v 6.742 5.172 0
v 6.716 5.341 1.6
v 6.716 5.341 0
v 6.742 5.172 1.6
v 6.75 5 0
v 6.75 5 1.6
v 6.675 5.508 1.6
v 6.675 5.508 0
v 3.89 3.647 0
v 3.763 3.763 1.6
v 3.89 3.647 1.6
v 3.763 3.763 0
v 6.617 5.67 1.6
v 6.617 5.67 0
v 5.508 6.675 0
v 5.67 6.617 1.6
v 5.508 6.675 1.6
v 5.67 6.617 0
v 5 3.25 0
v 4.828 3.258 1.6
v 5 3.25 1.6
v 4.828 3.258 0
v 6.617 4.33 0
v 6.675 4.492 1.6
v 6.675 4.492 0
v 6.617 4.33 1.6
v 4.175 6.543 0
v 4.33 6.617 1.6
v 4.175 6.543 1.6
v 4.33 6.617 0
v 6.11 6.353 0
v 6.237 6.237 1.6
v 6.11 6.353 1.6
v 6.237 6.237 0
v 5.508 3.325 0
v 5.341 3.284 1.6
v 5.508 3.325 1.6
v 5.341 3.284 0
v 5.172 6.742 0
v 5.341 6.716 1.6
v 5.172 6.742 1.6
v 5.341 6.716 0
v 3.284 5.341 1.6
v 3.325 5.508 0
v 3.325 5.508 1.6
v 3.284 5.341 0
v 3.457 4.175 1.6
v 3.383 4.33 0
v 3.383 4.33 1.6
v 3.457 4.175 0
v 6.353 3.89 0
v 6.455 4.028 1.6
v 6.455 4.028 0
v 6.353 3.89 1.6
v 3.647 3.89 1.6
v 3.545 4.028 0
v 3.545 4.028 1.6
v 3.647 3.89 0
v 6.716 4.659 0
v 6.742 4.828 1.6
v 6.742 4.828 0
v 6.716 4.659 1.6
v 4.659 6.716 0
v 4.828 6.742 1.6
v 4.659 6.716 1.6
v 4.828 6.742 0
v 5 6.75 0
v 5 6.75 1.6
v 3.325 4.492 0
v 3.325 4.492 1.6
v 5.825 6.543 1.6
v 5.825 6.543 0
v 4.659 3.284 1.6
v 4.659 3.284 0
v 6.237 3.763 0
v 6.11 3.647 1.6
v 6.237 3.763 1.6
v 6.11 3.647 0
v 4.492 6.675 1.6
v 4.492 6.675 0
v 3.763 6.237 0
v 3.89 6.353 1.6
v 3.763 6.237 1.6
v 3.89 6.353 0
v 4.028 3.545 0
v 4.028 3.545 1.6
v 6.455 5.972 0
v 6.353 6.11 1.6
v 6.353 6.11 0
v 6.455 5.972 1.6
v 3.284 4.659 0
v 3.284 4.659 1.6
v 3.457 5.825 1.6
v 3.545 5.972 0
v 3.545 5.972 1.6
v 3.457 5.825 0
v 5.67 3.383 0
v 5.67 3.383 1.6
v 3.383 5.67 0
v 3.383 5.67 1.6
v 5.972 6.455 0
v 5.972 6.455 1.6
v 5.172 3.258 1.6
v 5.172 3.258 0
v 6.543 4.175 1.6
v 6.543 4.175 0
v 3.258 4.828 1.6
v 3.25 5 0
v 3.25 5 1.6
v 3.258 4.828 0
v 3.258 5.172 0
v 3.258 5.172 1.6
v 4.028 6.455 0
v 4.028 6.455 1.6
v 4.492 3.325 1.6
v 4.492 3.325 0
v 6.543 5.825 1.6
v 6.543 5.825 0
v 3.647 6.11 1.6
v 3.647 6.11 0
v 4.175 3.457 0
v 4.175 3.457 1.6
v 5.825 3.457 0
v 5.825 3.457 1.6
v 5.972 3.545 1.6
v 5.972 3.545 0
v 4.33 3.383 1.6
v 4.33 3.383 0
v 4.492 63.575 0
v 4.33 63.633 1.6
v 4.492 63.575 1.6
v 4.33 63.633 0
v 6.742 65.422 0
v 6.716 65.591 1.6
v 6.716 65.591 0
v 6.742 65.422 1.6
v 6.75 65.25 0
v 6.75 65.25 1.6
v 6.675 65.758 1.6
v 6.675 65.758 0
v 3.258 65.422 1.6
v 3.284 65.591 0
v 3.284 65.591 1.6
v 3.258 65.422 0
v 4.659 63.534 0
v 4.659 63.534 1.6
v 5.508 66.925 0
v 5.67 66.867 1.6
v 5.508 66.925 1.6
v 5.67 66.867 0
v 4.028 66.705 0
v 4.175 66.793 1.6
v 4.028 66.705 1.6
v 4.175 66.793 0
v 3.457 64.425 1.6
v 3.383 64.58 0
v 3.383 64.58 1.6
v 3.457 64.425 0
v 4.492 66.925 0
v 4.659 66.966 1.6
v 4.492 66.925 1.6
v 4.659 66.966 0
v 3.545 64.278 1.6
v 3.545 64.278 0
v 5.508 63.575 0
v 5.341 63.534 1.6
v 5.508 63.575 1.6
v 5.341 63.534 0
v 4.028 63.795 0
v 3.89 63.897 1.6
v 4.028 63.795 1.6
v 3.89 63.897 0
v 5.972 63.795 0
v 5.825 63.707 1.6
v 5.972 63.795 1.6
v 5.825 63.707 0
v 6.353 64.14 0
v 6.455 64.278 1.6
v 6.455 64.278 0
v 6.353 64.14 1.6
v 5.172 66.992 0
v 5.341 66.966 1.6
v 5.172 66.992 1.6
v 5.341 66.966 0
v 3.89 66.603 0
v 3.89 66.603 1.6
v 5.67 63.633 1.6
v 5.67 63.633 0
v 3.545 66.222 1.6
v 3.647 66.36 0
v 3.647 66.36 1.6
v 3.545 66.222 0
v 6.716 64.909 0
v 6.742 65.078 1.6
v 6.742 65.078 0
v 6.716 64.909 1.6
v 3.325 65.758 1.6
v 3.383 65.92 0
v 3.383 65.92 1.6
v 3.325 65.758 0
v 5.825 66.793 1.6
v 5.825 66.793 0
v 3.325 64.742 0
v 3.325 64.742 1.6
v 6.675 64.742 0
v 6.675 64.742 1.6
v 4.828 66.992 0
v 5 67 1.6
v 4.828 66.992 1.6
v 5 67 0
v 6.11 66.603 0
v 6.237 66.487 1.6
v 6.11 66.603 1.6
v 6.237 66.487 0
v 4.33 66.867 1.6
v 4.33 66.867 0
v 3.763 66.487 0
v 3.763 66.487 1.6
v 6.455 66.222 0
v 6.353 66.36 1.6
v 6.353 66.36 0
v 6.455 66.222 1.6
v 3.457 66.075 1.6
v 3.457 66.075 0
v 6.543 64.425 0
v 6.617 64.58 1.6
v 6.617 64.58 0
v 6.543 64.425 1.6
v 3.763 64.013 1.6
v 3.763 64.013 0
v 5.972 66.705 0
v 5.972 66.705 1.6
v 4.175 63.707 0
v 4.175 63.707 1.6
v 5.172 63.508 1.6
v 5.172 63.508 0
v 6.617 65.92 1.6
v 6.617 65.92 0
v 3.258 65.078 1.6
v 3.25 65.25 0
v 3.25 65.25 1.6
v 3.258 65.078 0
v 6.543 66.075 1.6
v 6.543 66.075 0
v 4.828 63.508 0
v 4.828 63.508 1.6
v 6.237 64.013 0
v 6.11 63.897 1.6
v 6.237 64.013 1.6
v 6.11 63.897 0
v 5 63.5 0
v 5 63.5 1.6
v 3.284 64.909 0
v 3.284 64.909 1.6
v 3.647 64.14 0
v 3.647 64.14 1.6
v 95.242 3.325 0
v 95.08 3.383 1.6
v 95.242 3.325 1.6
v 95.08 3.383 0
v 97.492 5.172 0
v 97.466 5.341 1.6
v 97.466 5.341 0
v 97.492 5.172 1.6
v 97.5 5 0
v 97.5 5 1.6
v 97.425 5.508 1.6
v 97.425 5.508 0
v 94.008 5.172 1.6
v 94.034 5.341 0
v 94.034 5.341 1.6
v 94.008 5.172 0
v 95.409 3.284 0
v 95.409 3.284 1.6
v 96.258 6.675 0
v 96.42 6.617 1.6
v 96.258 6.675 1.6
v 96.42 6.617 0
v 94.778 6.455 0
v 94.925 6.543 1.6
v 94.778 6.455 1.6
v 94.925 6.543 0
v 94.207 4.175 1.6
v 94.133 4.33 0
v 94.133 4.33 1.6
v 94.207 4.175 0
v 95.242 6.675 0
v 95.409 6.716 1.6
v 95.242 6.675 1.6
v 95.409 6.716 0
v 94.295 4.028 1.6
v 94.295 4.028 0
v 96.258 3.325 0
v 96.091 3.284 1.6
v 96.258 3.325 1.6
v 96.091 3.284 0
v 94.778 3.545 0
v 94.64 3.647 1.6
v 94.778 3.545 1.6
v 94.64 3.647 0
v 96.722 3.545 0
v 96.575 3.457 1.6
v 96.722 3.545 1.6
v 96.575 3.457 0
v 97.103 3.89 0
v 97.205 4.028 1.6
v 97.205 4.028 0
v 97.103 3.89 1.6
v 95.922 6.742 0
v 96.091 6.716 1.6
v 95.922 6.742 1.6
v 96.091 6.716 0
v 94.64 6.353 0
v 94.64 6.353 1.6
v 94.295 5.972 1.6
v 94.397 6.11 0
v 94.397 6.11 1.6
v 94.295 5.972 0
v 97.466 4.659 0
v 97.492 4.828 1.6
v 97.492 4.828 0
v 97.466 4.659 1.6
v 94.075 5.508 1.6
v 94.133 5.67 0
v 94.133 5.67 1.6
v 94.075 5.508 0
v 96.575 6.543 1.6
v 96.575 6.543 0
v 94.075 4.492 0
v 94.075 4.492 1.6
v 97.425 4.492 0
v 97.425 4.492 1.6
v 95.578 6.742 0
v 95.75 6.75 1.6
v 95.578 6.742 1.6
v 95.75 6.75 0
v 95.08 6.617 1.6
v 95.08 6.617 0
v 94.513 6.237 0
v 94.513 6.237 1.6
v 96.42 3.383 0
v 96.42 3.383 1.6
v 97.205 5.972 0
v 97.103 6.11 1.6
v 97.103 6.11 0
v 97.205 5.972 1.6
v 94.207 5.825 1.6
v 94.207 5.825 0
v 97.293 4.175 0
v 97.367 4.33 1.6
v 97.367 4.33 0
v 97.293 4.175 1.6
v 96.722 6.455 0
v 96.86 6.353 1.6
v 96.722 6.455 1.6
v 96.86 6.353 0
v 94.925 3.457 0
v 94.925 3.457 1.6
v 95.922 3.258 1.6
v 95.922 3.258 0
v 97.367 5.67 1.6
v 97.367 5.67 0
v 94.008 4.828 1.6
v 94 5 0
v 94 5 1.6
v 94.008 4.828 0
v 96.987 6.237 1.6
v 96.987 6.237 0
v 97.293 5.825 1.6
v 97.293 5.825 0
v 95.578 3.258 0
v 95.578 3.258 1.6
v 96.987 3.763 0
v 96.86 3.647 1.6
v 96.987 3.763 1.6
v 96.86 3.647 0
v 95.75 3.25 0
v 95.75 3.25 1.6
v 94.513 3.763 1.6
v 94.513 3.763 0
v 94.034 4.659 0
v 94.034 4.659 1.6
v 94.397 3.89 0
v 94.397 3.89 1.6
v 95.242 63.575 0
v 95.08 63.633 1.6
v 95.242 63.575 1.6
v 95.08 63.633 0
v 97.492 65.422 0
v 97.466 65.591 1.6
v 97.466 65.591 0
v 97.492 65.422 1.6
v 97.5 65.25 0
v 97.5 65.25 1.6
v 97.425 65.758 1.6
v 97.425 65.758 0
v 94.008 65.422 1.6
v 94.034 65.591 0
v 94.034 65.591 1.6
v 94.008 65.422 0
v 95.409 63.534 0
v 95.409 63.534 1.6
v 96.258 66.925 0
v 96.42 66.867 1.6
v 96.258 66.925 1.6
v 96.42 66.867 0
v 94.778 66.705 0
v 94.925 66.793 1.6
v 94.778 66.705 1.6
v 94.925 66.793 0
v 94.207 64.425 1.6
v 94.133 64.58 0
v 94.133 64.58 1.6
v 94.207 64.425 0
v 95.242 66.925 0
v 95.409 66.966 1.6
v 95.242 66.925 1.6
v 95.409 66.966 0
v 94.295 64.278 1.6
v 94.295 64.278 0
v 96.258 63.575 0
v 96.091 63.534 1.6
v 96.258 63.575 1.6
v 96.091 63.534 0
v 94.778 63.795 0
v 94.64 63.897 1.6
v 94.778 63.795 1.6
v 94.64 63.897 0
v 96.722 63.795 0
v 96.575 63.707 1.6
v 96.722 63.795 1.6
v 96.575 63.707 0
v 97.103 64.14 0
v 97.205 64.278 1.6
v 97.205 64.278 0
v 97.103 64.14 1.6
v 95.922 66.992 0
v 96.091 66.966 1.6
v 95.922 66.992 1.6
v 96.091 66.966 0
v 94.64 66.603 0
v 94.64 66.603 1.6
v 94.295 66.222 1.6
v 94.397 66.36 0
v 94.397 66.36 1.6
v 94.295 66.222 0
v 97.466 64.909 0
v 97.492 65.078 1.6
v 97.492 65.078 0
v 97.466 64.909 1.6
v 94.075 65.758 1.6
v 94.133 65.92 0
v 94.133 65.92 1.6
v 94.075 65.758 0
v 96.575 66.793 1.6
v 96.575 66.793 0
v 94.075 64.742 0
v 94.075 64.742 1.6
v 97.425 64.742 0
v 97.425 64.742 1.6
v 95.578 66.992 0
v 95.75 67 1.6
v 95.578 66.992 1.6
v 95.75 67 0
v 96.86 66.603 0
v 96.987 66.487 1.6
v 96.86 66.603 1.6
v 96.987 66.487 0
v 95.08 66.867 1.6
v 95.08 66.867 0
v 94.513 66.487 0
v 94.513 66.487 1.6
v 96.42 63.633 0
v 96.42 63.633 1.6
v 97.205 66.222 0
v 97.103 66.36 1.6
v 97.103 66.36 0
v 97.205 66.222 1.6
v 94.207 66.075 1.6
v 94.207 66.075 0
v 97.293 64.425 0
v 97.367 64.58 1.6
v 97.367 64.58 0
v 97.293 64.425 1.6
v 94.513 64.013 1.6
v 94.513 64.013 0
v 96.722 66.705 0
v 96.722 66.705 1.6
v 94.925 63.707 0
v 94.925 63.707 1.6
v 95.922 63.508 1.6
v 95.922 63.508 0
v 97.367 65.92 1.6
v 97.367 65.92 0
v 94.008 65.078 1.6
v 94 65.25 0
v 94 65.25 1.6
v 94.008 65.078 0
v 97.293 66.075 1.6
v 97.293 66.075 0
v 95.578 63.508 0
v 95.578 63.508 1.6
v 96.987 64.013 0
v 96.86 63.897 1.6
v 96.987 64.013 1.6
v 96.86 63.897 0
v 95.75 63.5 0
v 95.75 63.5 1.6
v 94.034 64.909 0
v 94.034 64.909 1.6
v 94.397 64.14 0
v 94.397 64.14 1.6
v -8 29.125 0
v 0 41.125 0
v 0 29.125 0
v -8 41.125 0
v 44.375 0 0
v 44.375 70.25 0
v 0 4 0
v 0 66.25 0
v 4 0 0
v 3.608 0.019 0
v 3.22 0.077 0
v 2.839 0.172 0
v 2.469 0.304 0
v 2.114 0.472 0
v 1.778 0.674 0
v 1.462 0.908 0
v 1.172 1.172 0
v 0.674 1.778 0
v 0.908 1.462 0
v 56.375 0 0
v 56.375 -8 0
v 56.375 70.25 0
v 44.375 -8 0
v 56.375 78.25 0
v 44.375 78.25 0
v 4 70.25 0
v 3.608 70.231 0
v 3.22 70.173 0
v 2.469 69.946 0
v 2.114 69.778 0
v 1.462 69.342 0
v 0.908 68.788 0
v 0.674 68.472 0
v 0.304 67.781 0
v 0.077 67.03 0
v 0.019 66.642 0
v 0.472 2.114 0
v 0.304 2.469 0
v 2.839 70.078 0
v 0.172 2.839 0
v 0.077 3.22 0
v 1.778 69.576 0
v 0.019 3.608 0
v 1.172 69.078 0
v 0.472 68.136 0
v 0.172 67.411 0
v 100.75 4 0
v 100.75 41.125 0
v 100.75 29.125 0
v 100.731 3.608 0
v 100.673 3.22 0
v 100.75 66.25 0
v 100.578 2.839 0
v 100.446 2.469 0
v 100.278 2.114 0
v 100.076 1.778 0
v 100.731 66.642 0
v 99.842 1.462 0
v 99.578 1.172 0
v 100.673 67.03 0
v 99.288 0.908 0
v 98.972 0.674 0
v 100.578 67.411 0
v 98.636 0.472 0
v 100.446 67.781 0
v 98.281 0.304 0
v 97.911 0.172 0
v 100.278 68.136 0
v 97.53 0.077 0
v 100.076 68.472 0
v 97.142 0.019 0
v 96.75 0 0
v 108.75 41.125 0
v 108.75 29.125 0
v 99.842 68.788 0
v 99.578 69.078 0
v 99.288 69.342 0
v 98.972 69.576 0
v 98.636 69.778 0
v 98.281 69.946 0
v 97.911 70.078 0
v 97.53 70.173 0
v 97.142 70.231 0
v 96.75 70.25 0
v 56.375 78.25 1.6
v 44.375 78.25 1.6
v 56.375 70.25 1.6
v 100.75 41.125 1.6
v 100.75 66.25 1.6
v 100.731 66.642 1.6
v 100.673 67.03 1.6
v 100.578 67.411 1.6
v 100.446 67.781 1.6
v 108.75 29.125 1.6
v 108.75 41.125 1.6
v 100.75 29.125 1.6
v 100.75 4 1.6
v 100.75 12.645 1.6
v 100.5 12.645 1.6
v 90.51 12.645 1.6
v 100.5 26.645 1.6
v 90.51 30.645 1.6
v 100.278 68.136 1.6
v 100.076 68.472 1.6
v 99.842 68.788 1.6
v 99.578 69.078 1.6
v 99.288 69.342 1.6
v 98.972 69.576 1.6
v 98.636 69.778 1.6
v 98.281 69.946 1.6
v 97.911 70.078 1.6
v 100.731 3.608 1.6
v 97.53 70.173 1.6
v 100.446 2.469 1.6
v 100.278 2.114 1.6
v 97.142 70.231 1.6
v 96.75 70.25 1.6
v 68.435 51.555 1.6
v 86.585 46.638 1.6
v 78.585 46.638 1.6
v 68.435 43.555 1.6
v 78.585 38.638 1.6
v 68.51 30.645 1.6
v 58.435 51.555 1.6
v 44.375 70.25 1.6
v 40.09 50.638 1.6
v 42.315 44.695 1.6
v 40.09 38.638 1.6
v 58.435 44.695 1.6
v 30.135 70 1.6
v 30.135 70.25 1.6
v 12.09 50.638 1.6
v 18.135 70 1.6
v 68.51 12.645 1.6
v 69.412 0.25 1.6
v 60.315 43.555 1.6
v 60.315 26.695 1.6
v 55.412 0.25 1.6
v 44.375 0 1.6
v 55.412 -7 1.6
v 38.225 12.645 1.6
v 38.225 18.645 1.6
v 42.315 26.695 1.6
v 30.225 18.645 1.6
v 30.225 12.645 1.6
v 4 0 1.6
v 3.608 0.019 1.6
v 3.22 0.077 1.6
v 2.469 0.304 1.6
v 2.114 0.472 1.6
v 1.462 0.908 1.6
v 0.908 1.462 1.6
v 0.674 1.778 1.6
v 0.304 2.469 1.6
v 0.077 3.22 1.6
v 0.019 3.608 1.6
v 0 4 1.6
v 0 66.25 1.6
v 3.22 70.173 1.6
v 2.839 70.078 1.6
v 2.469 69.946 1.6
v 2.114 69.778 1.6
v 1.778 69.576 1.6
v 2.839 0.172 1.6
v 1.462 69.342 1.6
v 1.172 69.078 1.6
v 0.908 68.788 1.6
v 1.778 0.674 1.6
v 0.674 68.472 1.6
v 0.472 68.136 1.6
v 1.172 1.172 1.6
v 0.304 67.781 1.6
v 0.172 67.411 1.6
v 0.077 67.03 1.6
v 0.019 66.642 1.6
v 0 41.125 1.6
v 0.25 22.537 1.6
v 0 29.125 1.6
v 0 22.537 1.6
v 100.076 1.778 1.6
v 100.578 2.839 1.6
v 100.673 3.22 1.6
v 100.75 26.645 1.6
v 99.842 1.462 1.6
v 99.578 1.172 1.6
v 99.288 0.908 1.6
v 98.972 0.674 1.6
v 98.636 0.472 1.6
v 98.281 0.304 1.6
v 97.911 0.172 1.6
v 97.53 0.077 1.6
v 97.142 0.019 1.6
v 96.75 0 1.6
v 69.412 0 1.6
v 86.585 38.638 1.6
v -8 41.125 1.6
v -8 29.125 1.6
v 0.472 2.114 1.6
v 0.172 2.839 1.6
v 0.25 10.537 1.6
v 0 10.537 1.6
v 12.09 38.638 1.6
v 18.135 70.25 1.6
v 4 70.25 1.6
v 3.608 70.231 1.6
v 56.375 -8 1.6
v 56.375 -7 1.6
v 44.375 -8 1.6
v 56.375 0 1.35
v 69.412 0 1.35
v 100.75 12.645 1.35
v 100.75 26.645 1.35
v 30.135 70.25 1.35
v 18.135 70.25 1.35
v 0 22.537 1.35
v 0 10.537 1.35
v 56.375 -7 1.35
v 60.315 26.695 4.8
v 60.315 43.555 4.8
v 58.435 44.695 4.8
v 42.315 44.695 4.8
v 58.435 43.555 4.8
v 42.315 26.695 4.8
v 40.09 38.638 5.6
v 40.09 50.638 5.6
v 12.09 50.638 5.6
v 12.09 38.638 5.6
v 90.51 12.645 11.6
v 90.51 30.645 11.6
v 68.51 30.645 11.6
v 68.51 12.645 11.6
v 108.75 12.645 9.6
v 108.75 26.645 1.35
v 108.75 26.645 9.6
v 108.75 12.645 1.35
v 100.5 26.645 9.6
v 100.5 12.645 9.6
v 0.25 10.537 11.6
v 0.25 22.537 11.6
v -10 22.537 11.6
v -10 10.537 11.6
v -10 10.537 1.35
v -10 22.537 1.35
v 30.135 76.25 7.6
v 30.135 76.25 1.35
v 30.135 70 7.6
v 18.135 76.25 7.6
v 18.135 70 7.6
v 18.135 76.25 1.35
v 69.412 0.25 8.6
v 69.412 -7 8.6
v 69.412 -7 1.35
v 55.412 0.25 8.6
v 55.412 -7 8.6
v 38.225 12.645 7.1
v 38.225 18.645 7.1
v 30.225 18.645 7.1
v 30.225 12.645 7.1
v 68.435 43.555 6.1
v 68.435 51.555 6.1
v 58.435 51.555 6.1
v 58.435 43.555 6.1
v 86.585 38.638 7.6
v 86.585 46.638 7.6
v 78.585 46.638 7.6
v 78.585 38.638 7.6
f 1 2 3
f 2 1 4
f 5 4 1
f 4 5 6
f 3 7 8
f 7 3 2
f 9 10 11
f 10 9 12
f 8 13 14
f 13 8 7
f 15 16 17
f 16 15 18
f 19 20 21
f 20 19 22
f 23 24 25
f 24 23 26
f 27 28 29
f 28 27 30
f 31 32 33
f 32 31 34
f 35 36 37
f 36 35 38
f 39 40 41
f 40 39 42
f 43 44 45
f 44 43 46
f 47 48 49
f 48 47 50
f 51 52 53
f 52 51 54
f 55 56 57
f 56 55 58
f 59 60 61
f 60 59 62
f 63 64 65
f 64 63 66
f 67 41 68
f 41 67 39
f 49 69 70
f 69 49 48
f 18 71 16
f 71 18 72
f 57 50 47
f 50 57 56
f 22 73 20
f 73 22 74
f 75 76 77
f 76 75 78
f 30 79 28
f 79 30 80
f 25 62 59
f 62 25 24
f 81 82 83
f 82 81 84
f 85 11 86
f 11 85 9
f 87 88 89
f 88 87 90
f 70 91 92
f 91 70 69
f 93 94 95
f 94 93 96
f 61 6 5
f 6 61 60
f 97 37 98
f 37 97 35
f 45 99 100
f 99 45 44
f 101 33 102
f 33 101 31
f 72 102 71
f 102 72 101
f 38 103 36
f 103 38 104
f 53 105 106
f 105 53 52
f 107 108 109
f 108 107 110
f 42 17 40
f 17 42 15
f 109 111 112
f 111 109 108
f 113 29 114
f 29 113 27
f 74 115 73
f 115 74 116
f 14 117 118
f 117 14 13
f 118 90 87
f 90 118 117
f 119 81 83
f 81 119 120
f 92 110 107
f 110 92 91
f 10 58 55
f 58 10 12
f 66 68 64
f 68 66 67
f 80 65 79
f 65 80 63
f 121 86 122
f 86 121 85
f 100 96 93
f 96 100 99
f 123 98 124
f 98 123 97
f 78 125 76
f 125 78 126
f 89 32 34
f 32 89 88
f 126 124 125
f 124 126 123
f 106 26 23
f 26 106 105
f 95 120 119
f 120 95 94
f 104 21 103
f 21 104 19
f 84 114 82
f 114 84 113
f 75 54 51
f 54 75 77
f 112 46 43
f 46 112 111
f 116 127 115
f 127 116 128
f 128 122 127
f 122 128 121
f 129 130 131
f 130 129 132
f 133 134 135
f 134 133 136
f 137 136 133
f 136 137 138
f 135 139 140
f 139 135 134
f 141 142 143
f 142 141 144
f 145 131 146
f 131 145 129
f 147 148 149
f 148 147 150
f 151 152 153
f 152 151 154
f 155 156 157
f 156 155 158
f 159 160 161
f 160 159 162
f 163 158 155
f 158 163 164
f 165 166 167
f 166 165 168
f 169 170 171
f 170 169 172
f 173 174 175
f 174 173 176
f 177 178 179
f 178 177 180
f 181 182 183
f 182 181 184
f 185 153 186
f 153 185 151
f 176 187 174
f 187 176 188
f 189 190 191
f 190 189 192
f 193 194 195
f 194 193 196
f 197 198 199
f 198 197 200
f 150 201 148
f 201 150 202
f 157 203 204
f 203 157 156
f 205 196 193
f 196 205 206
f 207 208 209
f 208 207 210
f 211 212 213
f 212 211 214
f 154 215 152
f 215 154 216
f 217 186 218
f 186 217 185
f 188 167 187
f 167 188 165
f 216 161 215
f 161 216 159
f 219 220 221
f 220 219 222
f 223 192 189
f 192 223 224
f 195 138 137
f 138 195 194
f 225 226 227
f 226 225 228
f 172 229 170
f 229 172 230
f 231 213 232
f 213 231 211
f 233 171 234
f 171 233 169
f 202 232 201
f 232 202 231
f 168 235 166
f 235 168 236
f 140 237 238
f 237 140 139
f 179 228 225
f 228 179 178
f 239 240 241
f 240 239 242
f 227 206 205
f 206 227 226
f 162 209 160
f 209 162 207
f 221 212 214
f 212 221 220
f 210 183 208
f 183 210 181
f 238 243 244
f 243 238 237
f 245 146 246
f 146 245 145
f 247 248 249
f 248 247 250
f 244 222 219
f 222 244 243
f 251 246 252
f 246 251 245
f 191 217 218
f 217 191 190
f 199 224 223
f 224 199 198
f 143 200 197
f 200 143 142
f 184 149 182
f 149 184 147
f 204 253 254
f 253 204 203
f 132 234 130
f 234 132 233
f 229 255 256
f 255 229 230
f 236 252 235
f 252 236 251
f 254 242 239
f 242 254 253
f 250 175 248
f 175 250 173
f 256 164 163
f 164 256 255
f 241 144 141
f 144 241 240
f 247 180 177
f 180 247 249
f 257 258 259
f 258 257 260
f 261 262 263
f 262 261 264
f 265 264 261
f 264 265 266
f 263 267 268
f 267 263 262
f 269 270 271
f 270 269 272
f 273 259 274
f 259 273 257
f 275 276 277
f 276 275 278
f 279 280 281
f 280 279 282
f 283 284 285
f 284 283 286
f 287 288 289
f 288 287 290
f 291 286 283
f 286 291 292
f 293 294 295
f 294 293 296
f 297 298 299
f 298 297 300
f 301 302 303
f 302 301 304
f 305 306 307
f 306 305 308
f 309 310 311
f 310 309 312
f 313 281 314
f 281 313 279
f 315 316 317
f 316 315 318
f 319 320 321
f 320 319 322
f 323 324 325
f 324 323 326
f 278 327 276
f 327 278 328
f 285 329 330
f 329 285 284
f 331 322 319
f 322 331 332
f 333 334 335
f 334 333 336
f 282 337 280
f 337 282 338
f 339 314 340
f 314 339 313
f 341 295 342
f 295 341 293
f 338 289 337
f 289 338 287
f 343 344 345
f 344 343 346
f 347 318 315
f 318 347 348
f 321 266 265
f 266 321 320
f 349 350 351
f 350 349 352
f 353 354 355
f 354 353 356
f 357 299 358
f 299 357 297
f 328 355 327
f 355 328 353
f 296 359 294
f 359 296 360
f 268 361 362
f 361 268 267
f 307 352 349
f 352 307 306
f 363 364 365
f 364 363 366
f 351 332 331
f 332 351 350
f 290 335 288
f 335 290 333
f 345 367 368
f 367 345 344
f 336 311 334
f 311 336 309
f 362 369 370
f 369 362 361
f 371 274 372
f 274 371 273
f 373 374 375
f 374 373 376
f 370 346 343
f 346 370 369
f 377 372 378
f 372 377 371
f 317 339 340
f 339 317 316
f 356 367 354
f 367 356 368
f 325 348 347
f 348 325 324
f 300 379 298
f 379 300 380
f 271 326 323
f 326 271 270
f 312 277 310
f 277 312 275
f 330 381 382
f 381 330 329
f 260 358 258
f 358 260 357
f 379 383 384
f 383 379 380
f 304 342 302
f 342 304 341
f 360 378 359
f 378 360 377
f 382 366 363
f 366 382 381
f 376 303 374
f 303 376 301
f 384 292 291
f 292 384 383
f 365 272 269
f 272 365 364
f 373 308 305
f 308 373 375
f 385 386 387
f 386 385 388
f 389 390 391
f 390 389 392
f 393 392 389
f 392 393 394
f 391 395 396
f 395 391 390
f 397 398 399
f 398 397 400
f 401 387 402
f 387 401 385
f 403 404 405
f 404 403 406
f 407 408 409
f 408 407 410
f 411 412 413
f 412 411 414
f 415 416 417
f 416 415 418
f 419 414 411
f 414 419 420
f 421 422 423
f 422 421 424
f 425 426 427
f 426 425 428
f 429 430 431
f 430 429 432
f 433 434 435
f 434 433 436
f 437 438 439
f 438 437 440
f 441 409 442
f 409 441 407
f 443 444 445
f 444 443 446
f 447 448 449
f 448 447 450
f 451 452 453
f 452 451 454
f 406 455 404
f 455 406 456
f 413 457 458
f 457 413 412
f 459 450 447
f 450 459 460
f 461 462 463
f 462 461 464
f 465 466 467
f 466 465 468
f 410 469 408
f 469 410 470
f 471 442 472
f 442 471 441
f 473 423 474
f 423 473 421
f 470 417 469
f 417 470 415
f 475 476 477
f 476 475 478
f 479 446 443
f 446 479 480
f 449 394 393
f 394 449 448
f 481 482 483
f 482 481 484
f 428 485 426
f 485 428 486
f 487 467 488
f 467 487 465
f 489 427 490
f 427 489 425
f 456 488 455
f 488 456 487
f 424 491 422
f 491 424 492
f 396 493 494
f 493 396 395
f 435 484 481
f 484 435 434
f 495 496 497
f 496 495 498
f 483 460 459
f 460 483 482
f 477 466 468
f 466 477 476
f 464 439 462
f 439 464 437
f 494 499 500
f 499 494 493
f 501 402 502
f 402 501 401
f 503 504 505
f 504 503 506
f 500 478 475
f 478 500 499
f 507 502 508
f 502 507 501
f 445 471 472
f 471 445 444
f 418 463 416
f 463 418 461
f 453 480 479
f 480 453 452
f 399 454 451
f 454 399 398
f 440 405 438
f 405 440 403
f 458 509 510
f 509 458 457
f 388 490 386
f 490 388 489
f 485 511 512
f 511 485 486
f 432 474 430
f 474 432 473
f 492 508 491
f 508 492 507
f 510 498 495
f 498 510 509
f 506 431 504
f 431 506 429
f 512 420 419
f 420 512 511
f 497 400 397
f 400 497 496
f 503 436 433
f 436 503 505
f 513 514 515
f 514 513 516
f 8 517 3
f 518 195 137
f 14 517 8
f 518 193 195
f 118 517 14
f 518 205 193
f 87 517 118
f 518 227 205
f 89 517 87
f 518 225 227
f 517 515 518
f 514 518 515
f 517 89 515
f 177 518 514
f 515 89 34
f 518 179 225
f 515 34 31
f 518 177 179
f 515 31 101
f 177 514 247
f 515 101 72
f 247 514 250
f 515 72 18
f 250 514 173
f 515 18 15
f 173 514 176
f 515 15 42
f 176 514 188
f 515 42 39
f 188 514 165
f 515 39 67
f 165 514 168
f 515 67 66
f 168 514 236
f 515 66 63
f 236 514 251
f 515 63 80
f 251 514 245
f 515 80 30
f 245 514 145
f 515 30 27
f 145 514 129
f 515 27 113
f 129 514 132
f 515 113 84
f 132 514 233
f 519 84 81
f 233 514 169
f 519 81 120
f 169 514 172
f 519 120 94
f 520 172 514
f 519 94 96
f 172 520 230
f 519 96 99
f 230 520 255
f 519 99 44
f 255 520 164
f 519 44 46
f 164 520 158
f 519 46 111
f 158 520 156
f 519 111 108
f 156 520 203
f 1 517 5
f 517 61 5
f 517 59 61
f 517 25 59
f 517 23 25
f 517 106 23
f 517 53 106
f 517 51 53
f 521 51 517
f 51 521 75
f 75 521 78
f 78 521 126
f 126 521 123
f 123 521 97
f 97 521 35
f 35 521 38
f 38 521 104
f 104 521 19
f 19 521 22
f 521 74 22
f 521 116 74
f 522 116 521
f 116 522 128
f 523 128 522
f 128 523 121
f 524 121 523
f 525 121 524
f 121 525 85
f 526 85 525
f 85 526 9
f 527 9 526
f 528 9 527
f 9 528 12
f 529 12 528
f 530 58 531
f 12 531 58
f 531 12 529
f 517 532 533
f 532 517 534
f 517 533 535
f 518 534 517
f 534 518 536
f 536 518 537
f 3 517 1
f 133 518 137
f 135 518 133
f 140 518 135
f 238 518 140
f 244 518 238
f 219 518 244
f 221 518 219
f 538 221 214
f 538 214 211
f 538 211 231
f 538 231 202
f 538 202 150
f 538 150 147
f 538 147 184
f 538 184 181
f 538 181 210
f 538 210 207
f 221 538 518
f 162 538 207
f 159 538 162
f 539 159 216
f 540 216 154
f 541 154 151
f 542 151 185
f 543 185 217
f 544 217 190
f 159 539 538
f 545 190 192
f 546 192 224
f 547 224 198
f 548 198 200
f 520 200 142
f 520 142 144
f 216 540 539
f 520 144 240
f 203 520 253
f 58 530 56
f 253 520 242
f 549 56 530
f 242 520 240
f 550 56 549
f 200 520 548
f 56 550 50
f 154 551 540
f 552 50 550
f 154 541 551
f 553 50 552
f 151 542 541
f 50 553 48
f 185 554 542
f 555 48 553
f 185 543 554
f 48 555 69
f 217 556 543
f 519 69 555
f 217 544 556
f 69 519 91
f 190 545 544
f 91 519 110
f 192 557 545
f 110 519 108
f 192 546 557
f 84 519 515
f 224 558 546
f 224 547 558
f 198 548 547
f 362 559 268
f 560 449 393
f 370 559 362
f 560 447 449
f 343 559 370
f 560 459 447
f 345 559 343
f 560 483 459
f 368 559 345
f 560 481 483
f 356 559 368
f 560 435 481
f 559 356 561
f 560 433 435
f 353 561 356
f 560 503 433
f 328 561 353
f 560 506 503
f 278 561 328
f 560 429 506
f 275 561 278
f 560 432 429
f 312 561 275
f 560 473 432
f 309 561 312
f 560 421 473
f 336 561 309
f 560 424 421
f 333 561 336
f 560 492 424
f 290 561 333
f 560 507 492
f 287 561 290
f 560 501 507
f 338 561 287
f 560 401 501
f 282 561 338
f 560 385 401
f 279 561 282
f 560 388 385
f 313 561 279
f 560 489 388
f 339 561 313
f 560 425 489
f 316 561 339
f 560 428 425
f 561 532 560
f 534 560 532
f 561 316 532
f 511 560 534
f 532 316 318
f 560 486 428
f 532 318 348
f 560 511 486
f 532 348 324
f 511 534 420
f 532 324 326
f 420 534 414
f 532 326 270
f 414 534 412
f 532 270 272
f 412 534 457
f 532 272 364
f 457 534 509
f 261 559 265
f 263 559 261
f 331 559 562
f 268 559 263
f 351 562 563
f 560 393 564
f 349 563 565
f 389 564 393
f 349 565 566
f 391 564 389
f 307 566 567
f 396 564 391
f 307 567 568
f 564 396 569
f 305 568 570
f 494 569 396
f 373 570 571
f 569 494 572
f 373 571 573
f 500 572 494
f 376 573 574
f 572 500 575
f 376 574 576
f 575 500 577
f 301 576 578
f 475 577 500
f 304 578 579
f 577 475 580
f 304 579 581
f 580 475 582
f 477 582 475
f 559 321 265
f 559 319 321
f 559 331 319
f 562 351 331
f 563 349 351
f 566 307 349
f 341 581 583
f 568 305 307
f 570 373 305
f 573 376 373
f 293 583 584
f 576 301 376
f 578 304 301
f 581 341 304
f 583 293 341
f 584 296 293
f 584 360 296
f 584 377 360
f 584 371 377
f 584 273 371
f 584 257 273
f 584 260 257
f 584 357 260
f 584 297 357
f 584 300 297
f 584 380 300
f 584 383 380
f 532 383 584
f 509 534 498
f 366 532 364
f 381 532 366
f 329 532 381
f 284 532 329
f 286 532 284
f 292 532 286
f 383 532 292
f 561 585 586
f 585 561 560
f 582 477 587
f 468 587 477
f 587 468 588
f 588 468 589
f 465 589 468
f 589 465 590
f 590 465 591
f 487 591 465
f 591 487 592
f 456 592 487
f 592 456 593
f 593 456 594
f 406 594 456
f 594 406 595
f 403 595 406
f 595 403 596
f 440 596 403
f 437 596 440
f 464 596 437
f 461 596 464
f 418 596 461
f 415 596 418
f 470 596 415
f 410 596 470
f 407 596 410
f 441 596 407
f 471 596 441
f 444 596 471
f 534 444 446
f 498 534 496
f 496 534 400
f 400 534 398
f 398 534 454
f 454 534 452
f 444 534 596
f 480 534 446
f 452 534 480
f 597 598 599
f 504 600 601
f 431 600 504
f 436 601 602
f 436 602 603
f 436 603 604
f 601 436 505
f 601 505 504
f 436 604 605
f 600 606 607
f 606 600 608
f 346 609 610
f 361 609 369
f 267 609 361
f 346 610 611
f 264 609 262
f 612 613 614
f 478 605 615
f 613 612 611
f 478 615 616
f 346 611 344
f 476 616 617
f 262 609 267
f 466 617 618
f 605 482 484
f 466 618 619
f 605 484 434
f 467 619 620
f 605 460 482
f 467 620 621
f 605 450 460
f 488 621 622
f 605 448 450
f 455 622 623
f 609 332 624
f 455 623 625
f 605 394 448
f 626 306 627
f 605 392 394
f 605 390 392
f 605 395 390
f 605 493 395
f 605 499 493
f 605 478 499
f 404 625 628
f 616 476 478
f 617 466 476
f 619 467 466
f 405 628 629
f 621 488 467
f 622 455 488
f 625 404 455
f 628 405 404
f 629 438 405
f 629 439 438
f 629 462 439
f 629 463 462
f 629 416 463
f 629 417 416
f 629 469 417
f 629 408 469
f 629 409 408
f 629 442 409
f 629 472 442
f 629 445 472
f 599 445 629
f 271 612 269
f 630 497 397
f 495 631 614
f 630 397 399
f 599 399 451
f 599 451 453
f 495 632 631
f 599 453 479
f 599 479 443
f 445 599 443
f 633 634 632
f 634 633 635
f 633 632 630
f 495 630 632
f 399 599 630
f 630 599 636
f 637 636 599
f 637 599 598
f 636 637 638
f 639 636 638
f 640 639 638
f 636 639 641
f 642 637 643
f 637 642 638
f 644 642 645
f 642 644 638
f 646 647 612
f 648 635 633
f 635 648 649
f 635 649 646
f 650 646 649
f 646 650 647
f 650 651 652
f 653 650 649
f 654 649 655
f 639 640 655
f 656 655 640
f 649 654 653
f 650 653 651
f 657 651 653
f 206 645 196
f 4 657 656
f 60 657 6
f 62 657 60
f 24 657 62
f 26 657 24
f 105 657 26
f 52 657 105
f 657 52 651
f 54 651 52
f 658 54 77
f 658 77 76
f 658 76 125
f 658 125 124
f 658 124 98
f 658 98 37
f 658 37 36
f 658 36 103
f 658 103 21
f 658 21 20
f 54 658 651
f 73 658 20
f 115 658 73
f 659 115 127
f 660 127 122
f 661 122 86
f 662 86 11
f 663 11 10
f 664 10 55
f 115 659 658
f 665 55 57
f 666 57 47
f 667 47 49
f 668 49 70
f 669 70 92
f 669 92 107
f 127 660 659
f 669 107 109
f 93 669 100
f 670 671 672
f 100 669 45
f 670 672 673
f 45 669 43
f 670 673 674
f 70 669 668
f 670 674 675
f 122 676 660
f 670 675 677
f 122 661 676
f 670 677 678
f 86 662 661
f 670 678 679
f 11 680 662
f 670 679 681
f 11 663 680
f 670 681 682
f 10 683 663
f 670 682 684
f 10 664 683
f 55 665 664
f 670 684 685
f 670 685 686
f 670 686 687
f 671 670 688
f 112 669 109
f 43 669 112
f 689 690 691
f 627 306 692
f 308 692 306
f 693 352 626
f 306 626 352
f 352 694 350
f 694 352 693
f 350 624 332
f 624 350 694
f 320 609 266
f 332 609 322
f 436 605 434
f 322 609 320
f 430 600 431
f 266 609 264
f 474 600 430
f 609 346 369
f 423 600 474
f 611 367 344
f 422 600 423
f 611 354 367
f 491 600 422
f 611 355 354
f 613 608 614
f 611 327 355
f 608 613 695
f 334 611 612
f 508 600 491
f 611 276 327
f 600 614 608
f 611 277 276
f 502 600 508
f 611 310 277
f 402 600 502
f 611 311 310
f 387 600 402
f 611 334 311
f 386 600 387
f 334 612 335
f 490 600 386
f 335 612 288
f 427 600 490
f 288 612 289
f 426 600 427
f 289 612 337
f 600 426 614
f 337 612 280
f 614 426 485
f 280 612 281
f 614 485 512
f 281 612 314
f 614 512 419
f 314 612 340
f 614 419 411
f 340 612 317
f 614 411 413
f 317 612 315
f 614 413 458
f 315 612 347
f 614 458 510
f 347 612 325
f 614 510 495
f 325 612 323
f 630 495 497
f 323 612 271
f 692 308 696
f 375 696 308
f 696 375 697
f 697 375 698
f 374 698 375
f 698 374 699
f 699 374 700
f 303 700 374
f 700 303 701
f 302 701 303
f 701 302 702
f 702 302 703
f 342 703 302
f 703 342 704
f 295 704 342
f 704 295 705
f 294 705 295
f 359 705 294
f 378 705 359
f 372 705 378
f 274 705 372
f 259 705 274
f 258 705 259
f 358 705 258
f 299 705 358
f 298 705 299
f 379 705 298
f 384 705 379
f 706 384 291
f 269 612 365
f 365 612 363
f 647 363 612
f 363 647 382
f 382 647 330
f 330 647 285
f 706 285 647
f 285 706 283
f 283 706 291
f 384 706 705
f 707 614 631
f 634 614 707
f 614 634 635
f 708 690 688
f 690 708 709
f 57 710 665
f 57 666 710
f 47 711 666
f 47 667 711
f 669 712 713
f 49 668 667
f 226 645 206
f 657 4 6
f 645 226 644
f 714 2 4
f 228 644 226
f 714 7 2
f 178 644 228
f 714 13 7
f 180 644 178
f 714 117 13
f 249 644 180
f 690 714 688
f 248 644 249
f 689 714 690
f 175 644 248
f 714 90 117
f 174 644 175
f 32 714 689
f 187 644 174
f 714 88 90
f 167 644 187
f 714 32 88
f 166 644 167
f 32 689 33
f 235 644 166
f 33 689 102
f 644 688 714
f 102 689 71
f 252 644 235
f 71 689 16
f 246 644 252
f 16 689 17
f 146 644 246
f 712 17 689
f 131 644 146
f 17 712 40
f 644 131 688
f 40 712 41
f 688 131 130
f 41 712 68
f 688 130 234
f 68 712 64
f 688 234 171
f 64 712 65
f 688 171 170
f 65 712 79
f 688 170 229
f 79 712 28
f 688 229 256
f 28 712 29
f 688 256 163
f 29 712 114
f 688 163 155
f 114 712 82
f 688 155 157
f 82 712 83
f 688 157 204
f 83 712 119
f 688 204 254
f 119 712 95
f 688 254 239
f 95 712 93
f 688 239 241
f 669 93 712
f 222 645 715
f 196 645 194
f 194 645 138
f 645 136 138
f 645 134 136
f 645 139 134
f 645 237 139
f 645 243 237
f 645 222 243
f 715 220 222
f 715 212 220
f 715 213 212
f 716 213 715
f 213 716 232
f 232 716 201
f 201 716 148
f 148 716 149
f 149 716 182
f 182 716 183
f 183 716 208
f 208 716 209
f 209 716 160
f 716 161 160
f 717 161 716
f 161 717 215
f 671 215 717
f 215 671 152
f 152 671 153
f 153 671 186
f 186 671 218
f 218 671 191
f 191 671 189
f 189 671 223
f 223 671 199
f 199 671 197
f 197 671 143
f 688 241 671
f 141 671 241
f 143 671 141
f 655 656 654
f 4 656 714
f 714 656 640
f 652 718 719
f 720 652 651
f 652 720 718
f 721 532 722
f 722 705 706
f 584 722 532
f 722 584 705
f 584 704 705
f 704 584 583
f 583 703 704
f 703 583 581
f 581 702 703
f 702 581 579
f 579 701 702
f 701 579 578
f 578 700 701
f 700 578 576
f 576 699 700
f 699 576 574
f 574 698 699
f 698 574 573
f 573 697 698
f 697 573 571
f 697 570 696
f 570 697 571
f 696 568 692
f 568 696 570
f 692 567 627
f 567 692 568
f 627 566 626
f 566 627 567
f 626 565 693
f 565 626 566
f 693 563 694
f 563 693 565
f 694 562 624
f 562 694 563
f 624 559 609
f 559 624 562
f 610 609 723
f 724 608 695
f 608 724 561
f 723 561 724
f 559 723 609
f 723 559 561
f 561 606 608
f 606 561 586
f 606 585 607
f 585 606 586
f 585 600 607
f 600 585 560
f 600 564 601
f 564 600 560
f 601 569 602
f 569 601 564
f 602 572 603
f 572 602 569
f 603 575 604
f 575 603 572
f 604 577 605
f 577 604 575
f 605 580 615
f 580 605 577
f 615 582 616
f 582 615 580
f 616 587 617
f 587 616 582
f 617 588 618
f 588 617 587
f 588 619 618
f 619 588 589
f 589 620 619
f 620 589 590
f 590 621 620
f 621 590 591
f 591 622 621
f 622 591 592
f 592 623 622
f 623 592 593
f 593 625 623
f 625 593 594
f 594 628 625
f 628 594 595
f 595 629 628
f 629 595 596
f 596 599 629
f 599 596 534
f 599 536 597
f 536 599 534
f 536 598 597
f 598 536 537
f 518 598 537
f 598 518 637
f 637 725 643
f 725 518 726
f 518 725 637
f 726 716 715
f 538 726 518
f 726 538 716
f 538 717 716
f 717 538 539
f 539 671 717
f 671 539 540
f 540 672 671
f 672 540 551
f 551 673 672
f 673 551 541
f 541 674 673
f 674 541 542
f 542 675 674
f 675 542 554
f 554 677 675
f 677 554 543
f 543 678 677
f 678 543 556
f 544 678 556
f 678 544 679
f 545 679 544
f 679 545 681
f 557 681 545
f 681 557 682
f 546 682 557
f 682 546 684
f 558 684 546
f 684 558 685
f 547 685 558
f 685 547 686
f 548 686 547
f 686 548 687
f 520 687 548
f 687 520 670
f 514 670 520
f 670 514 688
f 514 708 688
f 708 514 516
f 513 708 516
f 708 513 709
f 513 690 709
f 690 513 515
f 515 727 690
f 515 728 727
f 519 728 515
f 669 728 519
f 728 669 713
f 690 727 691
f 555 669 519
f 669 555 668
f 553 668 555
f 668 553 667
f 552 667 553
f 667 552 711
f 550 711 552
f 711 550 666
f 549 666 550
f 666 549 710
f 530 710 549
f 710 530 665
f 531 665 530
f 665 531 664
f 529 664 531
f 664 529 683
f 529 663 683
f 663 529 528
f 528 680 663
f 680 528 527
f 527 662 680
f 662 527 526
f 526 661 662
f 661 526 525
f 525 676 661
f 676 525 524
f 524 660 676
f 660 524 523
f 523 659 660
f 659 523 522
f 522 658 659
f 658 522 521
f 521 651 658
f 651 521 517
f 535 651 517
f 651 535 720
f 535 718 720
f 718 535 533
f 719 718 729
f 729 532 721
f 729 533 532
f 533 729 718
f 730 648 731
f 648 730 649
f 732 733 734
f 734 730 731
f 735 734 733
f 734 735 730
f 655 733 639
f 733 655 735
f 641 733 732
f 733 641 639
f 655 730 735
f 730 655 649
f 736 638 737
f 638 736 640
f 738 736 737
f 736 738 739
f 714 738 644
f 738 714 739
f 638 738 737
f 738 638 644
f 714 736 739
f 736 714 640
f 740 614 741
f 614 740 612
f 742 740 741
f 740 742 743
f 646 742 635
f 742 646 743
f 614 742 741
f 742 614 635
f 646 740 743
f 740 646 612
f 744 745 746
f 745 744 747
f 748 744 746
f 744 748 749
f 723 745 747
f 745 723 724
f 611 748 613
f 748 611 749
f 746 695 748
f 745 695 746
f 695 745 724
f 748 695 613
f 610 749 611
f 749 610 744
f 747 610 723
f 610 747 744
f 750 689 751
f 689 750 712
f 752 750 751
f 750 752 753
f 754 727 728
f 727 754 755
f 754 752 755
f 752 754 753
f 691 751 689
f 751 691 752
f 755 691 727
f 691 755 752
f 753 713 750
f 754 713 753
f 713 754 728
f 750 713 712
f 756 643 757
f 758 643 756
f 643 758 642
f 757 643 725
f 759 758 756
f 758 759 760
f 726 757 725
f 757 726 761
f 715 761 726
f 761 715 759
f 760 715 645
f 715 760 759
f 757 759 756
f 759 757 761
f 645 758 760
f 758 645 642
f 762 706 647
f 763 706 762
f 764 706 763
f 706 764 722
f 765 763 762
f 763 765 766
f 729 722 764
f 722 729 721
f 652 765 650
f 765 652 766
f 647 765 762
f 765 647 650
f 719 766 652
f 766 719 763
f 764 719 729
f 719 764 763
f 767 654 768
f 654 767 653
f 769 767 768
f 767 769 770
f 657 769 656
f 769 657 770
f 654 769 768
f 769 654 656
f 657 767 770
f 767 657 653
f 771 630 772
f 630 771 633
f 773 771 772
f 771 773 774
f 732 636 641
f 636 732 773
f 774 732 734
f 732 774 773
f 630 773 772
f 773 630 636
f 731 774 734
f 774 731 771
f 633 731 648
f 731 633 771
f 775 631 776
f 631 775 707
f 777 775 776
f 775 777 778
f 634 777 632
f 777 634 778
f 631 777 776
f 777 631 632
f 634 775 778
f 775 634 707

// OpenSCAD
$fn = 64;

// Target dimensions (mm)
pcb_length    = 100.75;
pcb_width     = 70.25;
pcb_thickness = 1.6;

// Board details
corner_radius           = 4;
mounting_hole_diameter  = 3.5;
mounting_hole_offset_x  = 5.0;
mounting_hole_offset_y  = 5.0;

// Small overlap to guarantee one connected solid
overlap = 0.25;

// Tab/ear geometry to match reference silhouette (protrusions on edges)
tab_w = 12;   // width along edge
tab_d = 8;    // protrusion depth outward from board edge

// ---------- Helpers ----------
module rounded_rect_2d(L, W, R) {
    hull() {
        translate([ R,     R]) circle(r=R);
        translate([L - R,  R]) circle(r=R);
        translate([ R, W - R]) circle(r=R);
        translate([L - R, W - R]) circle(r=R);
    }
}

module pcb_outline_2d() {
    // Base rounded rectangle + 4 edge tabs (top, bottom, left, right)
    union() {
        rounded_rect_2d(pcb_length, pcb_width, corner_radius);

        // Top tab (centered)
        translate([pcb_length/2 - tab_w/2, pcb_width - overlap])
            square([tab_w, tab_d + overlap], center=false);

        // Bottom tab (centered)
        translate([pcb_length/2 - tab_w/2, -tab_d])
            square([tab_w, tab_d + overlap], center=false);

        // Left tab (centered)
        translate([-tab_d, pcb_width/2 - tab_w/2])
            square([tab_d + overlap, tab_w], center=false);

        // Right tab (centered)
        translate([pcb_length - overlap, pcb_width/2 - tab_w/2])
            square([tab_d + overlap, tab_w], center=false);
    }
}

module pcb_body() {
    // PCB with mounting holes
    difference() {
        linear_extrude(height=pcb_thickness)
            pcb_outline_2d();

        for (x = [mounting_hole_offset_x, pcb_length - mounting_hole_offset_x])
            for (y = [mounting_hole_offset_y, pcb_width - mounting_hole_offset_y])
                translate([x, y, pcb_thickness/2])
                    cylinder(h=pcb_thickness + 2, d=mounting_hole_diameter, center=true);
    }
}

// Generic component that is guaranteed to touch the PCB top surface
module component_box(pos=[0,0], size=[10,10,5]) {
    translate([pos[0], pos[1], pcb_thickness - overlap])
        cube([size[0], size[1], size[2] + overlap], center=false);
}

// Edge connector that protrudes beyond the PCB outline but remains connected
module edge_connector(side="right", along=10, body=[14, 10, 9], protrude=6) {
    // body = [size_x, size_y, height] (only size_y used for left/right; size_x used for top/bottom)
    if (side == "right") {
        translate([pcb_length - overlap, along, pcb_thickness - overlap])
            cube([protrude + overlap, body[1], body[2] + overlap], center=false);
    } else if (side == "left") {
        translate([-protrude, along, pcb_thickness - overlap])
            cube([protrude + overlap, body[1], body[2] + overlap], center=false);
    } else if (side == "top") {
        translate([along, pcb_width - overlap, pcb_thickness - overlap])
            cube([body[0], protrude + overlap, body[2] + overlap], center=false);
    } else if (side == "bottom") {
        translate([along, -protrude, pcb_thickness - overlap])
            cube([body[0], protrude + overlap, body[2] + overlap], center=false);
    }
}

// ---------- Assembly (ONE connected solid) ----------
module mainboard_assembly() {
    union() {
        // PCB (100.75 x 70.25 x 1.6) with tabs and mounting holes
        pcb_body();

        // Major IC / MCU
        component_box(
            pos=[pcb_length*0.42, pcb_width*0.38],
            size=[18, 18, 3.2]
        );

        // Stepper driver area (blocky representation)
        component_box(
            pos=[pcb_length*0.12, pcb_width*0.55],
            size=[28, 12, 4.0]
        );

        // Power section / heatsink block
        component_box(
            pos=[pcb_length*0.68, pcb_width*0.18],
            size=[22, 18, 10.0]
        );

        // USB / comms connector on right edge (connected)
        edge_connector(
            side="right",
            along=pcb_width*0.18,
            body=[0, 14, 8],
            protrude=8
        );

        // Power input connector on left edge (connected)
        edge_connector(
            side="left",
            along=pcb_width*0.15,
            body=[0, 12, 10],
            protrude=10
        );

        // Endstop / IO header on top edge (connected)
        edge_connector(
            side="top",
            along=pcb_length*0.18,
            body=[12, 0, 6],
            protrude=6
        );

        // Motor header block on bottom edge (connected)
        edge_connector(
            side="bottom",
            along=pcb_length*0.55,
            body=[14, 0, 7],
            protrude=7
        );

        // A few small capacitors/regulators (simple blocks)
        component_box(
            pos=[pcb_length*0.30, pcb_width*0.18],
            size=[8, 6, 5.5]
        );
        component_box(
            pos=[pcb_length*0.58, pcb_width*0.62],
            size=[10, 8, 4.5]
        );
        component_box(
            pos=[pcb_length*0.78, pcb_width*0.55],
            size=[8, 8, 6.0]
        );
    }
}

mainboard_assembly();
